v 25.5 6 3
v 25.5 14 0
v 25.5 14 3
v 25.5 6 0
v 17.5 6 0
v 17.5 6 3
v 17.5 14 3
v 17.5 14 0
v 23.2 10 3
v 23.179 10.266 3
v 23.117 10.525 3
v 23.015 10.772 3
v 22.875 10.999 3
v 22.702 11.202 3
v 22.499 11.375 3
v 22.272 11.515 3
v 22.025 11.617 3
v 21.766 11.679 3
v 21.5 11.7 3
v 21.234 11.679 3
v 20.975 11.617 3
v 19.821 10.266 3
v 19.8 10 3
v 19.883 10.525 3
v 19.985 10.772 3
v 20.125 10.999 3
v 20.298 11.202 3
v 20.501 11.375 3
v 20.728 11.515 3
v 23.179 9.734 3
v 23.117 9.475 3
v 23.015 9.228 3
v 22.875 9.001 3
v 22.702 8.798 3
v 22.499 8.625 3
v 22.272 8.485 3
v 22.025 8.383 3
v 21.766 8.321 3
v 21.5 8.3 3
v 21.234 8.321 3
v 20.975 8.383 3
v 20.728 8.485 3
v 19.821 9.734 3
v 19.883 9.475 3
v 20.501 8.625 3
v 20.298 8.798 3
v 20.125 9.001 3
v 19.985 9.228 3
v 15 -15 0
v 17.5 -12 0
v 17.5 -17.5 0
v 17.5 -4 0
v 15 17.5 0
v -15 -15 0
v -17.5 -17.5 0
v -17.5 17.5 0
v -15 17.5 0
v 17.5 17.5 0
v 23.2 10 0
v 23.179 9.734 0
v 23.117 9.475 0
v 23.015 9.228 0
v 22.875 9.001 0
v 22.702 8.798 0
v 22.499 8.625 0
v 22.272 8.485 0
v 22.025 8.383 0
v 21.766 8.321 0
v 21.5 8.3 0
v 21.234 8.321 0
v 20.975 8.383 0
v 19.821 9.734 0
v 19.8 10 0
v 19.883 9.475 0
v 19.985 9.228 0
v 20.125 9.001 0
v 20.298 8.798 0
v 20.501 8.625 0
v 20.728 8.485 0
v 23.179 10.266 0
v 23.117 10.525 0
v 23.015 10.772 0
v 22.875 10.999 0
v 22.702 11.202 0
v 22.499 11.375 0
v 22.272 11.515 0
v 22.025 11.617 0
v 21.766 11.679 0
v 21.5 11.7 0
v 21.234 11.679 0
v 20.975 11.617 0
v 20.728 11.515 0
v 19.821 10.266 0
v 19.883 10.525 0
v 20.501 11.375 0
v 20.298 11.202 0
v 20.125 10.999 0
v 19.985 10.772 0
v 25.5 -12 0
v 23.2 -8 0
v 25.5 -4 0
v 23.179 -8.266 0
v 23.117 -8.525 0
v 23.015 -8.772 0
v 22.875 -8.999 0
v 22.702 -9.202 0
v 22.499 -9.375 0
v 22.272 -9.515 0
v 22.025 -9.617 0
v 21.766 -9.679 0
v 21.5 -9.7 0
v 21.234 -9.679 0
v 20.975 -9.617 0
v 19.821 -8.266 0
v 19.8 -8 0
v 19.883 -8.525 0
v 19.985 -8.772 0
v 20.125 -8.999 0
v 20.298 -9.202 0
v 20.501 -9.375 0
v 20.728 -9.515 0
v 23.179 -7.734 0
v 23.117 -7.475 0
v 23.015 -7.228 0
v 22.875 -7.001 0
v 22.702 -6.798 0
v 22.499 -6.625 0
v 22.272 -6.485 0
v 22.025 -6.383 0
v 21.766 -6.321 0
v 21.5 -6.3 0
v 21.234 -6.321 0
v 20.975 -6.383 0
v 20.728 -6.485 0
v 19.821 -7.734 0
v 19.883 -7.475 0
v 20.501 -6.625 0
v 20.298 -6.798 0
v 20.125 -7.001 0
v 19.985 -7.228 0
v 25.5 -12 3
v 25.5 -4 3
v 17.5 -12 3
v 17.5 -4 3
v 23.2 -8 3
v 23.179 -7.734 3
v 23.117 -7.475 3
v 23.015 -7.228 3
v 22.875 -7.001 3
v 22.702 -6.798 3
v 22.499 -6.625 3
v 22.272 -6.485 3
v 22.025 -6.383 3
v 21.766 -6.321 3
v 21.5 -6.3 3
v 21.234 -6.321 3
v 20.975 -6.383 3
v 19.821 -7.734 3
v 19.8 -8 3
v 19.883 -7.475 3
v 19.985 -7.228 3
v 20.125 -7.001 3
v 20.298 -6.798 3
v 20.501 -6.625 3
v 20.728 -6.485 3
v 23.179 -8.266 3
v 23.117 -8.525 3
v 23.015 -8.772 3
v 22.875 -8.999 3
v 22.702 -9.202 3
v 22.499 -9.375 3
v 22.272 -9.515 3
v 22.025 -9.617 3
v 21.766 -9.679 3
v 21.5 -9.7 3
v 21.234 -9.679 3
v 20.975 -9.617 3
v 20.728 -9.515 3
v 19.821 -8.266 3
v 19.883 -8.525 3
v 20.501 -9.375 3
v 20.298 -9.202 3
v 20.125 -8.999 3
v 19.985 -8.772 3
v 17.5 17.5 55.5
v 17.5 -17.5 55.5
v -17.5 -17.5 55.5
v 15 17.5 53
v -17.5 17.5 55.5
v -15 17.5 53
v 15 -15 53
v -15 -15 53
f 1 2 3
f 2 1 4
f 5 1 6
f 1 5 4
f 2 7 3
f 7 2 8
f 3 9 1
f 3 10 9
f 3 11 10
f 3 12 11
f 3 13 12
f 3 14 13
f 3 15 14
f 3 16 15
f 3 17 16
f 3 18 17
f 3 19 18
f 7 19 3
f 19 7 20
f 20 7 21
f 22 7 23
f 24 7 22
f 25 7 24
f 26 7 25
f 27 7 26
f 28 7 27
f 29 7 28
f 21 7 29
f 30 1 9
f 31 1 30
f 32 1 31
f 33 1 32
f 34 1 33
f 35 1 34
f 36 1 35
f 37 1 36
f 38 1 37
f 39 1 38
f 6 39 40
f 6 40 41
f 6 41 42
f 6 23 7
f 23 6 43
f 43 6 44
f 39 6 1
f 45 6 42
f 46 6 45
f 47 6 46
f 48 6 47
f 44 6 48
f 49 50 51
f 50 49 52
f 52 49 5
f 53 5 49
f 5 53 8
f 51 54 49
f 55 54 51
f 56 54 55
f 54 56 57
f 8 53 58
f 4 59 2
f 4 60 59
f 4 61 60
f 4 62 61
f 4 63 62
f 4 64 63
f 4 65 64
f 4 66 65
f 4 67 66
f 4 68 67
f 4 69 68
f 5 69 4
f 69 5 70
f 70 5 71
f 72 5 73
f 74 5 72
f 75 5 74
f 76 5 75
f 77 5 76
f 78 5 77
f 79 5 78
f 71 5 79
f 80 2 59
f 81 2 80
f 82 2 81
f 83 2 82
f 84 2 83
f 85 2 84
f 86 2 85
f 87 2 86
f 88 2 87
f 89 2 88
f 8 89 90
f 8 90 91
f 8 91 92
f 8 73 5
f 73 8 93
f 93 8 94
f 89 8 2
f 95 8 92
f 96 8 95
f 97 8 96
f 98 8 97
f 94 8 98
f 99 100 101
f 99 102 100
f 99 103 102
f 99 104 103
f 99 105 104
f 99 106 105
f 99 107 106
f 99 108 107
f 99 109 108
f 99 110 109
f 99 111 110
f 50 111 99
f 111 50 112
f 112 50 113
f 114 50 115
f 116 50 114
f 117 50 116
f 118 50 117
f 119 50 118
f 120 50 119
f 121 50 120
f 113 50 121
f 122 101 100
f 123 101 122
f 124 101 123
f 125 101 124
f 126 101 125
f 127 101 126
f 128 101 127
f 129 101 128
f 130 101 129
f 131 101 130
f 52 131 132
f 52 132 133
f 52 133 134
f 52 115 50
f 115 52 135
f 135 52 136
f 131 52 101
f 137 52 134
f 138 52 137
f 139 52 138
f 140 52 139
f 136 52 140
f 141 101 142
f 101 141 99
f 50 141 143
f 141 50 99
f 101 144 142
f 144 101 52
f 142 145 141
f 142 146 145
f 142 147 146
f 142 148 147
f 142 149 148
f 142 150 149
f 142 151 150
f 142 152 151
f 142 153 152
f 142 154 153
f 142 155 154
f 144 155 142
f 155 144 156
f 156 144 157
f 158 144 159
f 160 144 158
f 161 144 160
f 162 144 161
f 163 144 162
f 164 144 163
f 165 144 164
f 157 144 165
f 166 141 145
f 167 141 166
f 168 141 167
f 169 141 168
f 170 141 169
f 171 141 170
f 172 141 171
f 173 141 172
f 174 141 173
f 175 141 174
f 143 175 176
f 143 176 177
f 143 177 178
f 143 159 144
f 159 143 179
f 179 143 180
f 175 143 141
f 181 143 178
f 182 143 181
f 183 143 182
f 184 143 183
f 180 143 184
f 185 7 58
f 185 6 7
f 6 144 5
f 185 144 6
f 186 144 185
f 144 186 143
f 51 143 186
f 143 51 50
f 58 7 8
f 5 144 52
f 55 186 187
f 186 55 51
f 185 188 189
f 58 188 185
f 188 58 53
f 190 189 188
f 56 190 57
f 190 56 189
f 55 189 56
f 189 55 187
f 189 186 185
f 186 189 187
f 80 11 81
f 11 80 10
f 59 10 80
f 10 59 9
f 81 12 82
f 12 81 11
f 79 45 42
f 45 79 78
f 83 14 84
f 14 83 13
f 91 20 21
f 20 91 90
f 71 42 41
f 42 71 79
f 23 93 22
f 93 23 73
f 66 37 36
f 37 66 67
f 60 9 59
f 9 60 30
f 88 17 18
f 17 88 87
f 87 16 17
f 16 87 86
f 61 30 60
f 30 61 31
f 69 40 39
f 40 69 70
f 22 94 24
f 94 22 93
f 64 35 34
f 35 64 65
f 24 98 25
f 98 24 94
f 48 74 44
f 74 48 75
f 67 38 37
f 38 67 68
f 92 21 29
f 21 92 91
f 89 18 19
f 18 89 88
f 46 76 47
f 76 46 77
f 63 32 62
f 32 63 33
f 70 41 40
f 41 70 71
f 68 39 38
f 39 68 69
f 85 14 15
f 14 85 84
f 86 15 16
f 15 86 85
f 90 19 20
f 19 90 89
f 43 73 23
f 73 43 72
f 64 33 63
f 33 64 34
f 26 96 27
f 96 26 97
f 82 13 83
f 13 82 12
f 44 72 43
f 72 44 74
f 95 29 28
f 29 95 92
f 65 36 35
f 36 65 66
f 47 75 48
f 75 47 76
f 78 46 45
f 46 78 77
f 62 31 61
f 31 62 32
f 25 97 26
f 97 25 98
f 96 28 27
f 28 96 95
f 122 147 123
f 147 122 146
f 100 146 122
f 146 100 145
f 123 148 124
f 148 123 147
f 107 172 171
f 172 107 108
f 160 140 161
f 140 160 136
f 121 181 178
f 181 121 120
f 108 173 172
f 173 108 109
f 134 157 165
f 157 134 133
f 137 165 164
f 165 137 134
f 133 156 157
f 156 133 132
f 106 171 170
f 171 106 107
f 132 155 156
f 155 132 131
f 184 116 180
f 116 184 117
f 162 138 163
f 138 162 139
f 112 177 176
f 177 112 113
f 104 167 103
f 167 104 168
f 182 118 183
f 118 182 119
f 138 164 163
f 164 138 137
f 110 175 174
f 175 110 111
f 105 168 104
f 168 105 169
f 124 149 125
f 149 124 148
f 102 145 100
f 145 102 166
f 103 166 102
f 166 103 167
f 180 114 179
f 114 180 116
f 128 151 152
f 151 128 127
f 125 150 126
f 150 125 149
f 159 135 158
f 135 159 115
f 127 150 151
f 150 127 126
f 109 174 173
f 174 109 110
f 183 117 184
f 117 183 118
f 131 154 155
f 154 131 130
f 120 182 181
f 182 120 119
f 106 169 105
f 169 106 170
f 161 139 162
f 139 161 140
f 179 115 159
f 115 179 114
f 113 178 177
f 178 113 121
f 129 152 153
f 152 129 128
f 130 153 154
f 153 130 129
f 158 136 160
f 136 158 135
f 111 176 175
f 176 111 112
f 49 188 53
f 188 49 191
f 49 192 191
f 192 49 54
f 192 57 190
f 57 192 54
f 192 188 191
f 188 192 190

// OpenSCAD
include <../lib/solar-node-lib.scad>;
$fn = 40;
hood_print();
